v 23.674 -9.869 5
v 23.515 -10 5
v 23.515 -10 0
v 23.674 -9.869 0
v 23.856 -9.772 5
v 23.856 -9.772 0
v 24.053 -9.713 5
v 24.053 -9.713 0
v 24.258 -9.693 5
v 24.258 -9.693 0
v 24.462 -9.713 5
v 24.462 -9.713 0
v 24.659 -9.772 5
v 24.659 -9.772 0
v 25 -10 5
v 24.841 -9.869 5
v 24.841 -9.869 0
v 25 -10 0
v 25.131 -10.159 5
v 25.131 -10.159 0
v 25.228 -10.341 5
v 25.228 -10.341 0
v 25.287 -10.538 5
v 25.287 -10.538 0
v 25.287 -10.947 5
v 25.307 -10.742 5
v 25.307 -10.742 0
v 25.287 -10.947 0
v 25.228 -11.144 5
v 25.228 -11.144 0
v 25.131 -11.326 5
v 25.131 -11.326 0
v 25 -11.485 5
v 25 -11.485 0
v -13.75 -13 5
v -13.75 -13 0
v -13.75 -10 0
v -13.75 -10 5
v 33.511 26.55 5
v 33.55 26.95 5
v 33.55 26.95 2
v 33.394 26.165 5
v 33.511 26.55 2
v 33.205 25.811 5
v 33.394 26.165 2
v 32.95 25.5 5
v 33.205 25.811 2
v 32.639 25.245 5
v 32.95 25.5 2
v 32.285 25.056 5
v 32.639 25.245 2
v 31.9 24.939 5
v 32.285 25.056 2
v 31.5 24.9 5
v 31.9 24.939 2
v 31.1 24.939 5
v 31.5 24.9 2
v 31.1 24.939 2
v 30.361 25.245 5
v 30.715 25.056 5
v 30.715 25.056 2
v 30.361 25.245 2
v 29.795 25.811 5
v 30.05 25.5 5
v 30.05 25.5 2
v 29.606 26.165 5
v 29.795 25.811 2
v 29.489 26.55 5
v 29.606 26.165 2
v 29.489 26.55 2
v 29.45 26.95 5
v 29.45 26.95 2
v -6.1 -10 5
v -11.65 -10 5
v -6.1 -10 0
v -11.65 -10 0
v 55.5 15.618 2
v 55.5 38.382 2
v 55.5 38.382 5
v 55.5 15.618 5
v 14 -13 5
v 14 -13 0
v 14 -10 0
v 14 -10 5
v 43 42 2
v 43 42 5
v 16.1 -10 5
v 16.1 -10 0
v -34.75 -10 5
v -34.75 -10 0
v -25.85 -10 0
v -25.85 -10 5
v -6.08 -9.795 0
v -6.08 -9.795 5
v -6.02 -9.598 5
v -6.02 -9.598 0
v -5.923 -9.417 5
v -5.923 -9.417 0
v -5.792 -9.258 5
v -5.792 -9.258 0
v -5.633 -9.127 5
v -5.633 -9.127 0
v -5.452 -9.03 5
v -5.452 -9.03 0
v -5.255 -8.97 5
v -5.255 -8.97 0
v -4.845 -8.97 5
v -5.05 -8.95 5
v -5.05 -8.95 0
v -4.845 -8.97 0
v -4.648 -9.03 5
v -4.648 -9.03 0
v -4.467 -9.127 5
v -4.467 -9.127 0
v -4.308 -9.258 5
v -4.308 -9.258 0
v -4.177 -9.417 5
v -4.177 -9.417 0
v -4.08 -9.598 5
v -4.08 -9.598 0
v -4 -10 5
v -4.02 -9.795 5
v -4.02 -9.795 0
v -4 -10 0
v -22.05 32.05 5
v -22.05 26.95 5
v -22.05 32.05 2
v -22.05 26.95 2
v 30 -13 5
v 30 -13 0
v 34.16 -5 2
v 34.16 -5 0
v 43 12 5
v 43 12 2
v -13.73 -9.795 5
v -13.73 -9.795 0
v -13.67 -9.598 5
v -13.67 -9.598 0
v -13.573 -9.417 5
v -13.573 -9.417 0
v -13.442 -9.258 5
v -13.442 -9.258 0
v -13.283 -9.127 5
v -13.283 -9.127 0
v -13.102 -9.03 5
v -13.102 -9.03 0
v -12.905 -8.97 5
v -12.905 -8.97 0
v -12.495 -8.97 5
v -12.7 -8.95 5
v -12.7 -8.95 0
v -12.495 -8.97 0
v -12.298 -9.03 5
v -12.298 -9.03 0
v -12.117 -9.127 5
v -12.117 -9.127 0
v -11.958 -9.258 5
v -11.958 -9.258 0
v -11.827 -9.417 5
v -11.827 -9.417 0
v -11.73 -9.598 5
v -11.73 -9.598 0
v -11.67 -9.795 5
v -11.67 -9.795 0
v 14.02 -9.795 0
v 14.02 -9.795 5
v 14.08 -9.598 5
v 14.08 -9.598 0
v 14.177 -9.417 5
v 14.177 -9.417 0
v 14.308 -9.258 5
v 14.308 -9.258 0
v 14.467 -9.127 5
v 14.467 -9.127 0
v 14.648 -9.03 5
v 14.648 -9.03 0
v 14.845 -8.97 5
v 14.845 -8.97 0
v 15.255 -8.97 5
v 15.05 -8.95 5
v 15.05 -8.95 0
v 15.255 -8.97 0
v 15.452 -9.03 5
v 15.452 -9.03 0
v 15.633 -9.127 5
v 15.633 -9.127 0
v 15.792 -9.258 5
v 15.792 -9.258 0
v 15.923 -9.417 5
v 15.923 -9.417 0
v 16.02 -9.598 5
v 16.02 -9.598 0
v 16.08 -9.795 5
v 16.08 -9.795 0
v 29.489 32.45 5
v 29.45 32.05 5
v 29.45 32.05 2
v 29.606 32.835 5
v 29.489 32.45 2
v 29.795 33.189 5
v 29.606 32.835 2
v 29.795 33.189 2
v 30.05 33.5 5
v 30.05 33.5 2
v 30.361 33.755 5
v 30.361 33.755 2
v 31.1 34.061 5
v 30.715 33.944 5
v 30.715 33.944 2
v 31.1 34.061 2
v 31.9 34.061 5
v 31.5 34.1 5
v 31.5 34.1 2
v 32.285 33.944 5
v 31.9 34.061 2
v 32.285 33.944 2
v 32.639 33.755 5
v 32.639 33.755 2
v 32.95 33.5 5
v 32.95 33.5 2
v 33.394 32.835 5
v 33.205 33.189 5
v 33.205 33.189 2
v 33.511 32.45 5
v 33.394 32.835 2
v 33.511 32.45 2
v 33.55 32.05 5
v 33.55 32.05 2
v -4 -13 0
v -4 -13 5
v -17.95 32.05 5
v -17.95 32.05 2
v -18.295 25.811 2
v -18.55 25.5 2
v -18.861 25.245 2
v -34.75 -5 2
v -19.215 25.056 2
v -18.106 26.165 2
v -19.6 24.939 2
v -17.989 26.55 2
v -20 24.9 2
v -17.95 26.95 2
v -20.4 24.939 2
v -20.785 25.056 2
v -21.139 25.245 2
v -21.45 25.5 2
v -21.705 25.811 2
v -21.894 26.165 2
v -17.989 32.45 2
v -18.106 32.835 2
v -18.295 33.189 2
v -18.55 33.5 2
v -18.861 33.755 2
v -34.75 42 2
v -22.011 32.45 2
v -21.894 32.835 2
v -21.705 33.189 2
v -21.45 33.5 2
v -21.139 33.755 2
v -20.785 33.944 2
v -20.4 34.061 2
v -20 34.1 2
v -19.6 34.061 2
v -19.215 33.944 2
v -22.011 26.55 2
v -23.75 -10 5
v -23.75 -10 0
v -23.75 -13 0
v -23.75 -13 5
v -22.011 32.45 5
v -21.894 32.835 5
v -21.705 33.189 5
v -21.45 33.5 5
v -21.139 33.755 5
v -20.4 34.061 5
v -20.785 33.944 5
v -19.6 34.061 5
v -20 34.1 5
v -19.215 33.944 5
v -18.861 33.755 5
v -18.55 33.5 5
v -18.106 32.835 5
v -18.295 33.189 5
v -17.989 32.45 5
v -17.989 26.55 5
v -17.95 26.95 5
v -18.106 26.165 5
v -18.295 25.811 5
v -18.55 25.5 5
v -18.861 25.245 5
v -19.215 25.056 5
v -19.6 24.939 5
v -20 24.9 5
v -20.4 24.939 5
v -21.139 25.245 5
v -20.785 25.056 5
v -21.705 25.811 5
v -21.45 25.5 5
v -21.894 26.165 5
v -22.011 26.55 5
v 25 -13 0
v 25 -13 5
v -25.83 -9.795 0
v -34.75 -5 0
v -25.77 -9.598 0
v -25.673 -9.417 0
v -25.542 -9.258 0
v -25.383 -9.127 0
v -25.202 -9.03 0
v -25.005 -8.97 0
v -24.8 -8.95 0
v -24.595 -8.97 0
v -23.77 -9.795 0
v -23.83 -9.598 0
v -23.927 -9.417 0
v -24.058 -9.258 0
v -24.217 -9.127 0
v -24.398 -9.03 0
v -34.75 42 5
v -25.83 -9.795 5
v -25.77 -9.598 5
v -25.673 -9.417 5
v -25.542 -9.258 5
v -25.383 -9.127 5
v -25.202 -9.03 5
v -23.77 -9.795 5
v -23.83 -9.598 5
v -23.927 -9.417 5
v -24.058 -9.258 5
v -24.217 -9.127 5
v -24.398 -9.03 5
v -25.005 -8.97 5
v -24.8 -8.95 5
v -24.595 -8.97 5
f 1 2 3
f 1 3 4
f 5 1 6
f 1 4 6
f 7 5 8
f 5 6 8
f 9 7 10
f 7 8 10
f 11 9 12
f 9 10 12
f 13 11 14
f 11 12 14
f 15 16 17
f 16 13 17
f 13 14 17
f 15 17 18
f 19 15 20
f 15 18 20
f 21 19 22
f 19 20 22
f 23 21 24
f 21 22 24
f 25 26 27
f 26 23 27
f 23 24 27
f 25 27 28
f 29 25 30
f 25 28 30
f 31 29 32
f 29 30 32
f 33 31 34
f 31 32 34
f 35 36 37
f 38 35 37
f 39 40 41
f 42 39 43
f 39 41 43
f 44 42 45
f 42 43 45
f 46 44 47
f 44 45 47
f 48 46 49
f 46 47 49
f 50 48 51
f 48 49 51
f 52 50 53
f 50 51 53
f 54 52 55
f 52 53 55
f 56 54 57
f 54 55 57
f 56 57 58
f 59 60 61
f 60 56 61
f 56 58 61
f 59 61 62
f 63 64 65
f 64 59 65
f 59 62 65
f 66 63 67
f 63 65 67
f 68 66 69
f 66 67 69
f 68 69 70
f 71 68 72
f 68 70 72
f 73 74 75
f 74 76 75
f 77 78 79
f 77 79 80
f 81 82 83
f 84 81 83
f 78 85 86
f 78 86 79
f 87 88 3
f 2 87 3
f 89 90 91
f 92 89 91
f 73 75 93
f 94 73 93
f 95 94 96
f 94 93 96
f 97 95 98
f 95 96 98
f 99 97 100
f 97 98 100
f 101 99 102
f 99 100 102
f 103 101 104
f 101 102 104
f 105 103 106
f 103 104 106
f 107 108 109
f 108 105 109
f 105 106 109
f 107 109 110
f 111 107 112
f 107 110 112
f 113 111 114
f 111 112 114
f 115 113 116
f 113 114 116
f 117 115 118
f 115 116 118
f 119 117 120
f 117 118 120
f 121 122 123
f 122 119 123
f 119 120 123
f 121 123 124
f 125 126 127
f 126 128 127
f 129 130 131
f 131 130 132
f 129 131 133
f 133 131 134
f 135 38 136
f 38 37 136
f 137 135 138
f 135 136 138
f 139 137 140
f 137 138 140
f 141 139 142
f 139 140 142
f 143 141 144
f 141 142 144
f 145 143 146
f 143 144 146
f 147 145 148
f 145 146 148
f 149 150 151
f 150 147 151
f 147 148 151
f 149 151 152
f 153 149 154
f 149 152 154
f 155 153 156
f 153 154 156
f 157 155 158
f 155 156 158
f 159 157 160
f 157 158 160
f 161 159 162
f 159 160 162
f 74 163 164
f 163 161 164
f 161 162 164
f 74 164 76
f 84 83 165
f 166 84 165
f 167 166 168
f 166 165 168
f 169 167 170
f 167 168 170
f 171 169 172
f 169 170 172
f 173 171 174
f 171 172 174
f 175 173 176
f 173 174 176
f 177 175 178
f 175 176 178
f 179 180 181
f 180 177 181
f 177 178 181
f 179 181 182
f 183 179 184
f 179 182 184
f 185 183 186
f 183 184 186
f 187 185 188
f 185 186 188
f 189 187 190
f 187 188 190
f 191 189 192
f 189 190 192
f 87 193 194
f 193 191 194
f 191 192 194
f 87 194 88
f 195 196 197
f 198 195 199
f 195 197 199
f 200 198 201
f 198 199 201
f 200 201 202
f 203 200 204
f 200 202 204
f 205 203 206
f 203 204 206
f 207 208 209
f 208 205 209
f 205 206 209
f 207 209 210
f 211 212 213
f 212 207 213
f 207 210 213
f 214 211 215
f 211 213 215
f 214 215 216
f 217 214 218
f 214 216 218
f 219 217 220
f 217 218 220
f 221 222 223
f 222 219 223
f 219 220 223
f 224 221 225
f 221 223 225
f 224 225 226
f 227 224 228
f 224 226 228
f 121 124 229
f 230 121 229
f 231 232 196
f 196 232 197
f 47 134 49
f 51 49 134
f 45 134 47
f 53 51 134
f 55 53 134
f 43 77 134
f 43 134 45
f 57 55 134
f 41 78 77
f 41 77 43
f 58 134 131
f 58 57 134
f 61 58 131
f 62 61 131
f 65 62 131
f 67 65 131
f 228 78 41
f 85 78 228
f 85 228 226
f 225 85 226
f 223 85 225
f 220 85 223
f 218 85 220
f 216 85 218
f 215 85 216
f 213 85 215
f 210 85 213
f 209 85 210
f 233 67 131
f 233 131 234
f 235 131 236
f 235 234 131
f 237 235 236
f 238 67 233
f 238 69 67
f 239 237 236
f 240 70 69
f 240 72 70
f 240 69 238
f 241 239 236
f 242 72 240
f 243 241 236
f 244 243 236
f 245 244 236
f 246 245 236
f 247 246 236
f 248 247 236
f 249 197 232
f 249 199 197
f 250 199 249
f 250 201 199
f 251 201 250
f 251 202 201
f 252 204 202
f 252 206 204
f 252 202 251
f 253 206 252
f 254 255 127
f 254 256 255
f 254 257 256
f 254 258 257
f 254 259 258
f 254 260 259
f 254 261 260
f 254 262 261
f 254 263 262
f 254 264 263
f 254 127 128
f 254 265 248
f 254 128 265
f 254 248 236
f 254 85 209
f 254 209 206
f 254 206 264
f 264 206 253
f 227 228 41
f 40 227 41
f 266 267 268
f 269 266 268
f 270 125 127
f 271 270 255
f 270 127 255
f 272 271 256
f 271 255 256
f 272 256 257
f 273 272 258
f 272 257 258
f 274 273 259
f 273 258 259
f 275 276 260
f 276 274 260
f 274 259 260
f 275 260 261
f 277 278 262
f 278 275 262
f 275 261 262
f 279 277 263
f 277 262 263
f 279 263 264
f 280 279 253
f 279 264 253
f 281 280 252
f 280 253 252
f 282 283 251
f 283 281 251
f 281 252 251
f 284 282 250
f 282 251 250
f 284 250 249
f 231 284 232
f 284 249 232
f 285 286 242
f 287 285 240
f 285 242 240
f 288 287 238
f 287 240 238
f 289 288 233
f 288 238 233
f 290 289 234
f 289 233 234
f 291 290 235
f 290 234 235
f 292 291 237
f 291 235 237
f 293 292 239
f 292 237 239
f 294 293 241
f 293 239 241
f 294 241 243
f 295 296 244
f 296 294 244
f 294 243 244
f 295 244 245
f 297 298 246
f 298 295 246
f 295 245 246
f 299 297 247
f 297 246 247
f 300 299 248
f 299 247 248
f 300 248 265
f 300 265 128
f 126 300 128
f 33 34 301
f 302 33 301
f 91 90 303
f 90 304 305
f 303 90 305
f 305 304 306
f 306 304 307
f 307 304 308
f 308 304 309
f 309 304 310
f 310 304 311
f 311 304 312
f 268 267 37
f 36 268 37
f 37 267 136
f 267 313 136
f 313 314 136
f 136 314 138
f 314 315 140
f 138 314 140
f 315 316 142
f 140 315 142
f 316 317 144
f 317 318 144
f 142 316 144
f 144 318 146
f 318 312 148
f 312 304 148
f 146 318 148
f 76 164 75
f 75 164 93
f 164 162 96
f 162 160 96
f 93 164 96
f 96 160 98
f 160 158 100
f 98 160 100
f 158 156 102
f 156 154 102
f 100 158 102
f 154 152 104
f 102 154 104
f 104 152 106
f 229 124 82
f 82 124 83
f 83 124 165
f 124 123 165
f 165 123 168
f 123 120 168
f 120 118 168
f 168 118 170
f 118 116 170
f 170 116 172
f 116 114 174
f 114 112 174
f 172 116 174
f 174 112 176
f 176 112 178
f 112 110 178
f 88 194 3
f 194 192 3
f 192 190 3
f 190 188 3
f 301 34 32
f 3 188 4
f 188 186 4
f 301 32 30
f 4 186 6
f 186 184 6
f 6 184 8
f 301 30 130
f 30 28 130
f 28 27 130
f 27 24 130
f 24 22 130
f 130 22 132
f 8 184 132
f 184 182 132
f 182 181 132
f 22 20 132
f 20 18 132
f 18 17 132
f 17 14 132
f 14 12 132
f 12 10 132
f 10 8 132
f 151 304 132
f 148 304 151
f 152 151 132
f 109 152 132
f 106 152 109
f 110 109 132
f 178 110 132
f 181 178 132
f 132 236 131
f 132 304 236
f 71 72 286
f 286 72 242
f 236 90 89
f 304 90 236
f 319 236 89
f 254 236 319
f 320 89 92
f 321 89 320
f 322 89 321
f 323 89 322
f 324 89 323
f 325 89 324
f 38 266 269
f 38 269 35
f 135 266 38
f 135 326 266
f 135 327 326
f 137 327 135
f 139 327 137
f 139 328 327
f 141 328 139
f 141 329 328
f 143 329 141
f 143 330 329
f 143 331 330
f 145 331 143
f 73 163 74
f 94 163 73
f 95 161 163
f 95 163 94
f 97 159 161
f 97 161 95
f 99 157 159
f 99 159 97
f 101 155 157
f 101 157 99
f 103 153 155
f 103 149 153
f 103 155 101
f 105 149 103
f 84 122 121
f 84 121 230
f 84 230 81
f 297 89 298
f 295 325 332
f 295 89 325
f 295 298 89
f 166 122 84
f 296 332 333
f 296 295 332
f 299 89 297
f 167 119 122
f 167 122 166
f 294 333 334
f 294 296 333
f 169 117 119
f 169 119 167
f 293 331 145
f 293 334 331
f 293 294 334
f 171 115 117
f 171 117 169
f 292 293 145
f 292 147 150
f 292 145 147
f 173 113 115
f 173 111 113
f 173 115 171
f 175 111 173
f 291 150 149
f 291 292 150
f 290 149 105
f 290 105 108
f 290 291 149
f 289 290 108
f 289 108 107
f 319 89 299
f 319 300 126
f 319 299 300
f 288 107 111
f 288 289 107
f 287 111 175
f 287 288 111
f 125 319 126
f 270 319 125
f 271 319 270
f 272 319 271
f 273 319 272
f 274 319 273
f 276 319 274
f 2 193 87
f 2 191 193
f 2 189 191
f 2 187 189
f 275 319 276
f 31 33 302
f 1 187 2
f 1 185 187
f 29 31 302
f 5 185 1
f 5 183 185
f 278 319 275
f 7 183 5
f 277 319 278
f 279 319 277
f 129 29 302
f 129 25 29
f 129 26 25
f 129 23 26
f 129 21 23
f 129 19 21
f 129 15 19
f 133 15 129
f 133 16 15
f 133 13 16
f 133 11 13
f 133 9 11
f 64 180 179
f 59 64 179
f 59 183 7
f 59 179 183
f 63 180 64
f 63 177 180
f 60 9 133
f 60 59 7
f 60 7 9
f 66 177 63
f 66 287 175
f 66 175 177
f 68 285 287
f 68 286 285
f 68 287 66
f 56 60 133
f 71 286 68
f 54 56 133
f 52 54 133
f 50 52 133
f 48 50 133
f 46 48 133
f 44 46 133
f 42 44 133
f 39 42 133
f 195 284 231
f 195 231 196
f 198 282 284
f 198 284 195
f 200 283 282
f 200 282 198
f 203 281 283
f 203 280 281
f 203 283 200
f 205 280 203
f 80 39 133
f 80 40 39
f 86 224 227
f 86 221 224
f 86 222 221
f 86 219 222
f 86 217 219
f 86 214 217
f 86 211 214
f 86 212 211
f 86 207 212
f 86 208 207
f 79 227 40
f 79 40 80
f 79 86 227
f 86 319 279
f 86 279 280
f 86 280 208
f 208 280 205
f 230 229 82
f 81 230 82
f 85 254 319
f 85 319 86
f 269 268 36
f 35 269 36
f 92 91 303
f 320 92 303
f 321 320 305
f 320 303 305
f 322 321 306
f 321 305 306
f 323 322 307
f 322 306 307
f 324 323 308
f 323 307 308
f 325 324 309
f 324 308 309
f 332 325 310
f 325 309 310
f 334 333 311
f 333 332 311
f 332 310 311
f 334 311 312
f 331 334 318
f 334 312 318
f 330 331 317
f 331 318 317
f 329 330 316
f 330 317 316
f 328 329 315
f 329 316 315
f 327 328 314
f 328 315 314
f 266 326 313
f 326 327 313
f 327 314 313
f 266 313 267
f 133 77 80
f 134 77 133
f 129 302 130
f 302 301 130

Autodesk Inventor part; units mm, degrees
ref_plane "YZ Plane" through (0, 0, 0) normal (1, 0, 0) x (0, 1, 0)
ref_plane "XZ Plane" through (0, 0, 0) normal (0, 1, 0) x (-1, 0, 0)
ref_plane "XY Plane" through (0, 0, 0) normal (0, 0, 1) x (1, 0, 0)
sketch "スケッチ1" plane through (0, 0, 0) normal (0, 0, 1) x (1, 0, 0)
  line L0 (-34.75, -10) -> (23.5151, -10) construction
  arc A0 (25, -11.4849) -> (23.5151, -10) centre (24.2575, -10.7425) ccw
  line L1 (25, -11.4849) -> (25, -13)
  line L2 (25, -13) -> (30, -13)
  line L3 (23.5151, -10) -> (25, -10) construction
  line L4 (25, -10) -> (25, -11.4849) construction
  line L5 (-34.75, -10) -> (-34.75, 42)
  line L6 (-34.75, 42) -> (43, 42)
  circle A1 centre (-13, 37) radius 1.2
  circle A2 centre (13, 37) radius 1.2
  line L7 (0, 30.2) -> (0, 0) construction
  line L8 (30, -13) -> (43, 12)
  line L9 (43, 12) -> (43, 42)
  line L10 (-22.05, 32.05) -> (33.55, 32.05)
  line L11 (33.55, 32.05) -> (33.55, 26.95)
  line L12 (33.55, 26.95) -> (-22.05, 26.95)
  line L13 (-22.05, 26.95) -> (-22.05, 32.05)
  line L14 (33.5, 32) -> (-22, 32) construction
  line L15 (-22, 32) -> (-22, 27) construction
  line L16 (-22, 27) -> (33.5, 27) construction
  line L17 (33.5, 27) -> (33.5, 32) construction
  circle A3 centre (-20, 32.05) radius 2.05
  circle A4 centre (-20, 26.95) radius 2.05
  circle A5 centre (31.5, 32.05) radius 2.05
  circle A6 centre (31.5, 26.95) radius 2.05
  line L18 (-34.75, -10) -> (-25.85, -10)
  arc A7 (-23.75, -10) -> (-25.85, -10) centre (-24.8, -10) ccw
  line L19 (-23.75, -10) -> (-23.75, -13)
  line L20 (-23.75, -13) -> (-13.75, -13)
  line L21 (-13.75, -13) -> (-13.75, -10)
  arc A8 (-11.65, -10) -> (-13.75, -10) centre (-12.7, -10) ccw
  line L22 (-11.65, -10) -> (-6.1, -10)
  arc A9 (-4, -10) -> (-6.1, -10) centre (-5.05, -10) ccw
  line L23 (-4, -10) -> (-4, -13)
  line L24 (-4, -13) -> (14, -13)
  line L25 (14, -13) -> (14, -10)
  arc A10 (16.1, -10) -> (14, -10) centre (15.05, -10) ccw
  line L26 (16.1, -10) -> (23.5151, -10)
  line L27 (18.45, -6.1712) -> (21.55, -6.1712) construction
  line L28 (21.55, -6.1712) -> (21.55, -12.9737) construction
  line L29 (21.55, -12.9737) -> (18.45, -12.9737) construction
  line L30 (18.45, -12.9737) -> (18.45, -6.1712) construction
  line L31 (-31.3, -5.7897) -> (-28.2, -5.7897) construction
  line L32 (-28.2, -5.7897) -> (-28.2, -15) construction
  line L33 (-28.2, -15) -> (-31.3, -15) construction
  line L34 (-31.3, -15) -> (-31.3, -5.7897) construction
  line L35 (-29.75, -5.7897) -> (-29.75, -15) construction
  line L36 (20, -6.1712) -> (20, -12.9737) construction
  line L37 (43, 42) -> (55.5, 38.3823)
  line L38 (55.5, 38.3823) -> (55.5, 15.6177)
  line L39 (55.5, 15.6177) -> (43, 12)
  circle A11 centre (51, 35) radius 1.55
  circle A12 centre (51, 19) radius 1.55
  circle A13 centre (51, 35) radius 4.5 construction
  circle A14 centre (51, 19) radius 4.5 construction
  line L40 (51, 35) -> (51, 19) construction
  line L41 (-11.2651, 33.995) -> (-14.7349, 33.995)
  line L42 (-14.7349, 33.995) -> (-16.4699, 37)
  line L43 (-16.4699, 37) -> (-14.7349, 40.005)
  line L44 (-14.7349, 40.005) -> (-11.2651, 40.005)
  line L45 (-11.2651, 40.005) -> (-9.5301, 37)
  line L46 (-9.5301, 37) -> (-11.2651, 33.995)
  circle A15 centre (-15.4199, 37) radius 1.05
  circle A16 centre (-14.2099, 34.9043) radius 1.05
  circle A17 centre (-11.7901, 34.9043) radius 1.05
  circle A18 centre (-10.5801, 37) radius 1.05
  circle A19 centre (-11.7901, 39.0957) radius 1.05
  circle A20 centre (-14.2099, 39.0957) radius 1.05
  line L47 (16.4699, 37) -> (14.7349, 33.995)
  line L48 (14.7349, 33.995) -> (11.2651, 33.995)
  line L49 (11.2651, 33.995) -> (9.5301, 37)
  line L50 (9.5301, 37) -> (11.2651, 40.005)
  line L51 (11.2651, 40.005) -> (14.7349, 40.005)
  line L52 (14.7349, 40.005) -> (16.4699, 37)
  circle A21 centre (10.5801, 37) radius 1.05
  circle A22 centre (11.7901, 34.9043) radius 1.05
  circle A23 centre (14.2099, 34.9043) radius 1.05
  circle A24 centre (15.4199, 37) radius 1.05
  circle A25 centre (14.2099, 39.0957) radius 1.05
  circle A26 centre (11.7901, 39.0957) radius 1.05
  line L53 (1.7349, 33.995) -> (-1.7349, 33.995)
  line L54 (-1.7349, 33.995) -> (-3.4699, 37)
  line L55 (-3.4699, 37) -> (-1.7349, 40.005)
  line L56 (-1.7349, 40.005) -> (1.7349, 40.005)
  line L57 (1.7349, 40.005) -> (3.4699, 37)
  line L58 (3.4699, 37) -> (1.7349, 33.995)
  circle A27 centre (-2.4199, 37) radius 1.05
  circle A28 centre (-1.2099, 34.9043) radius 1.05
  circle A29 centre (1.2099, 34.9043) radius 1.05
  circle A30 centre (2.4199, 37) radius 1.05
  circle A31 centre (1.2099, 39.0957) radius 1.05
  circle A32 centre (-1.2099, 39.0957) radius 1.05
  line L59 (51, 38.1754) -> (53.75, 36.5877)
  line L60 (53.75, 36.5877) -> (53.75, 33.4123)
  line L61 (53.75, 33.4123) -> (51, 31.8246)
  line L62 (51, 31.8246) -> (48.25, 33.4123)
  line L63 (48.25, 33.4123) -> (48.25, 36.5877)
  line L64 (48.25, 36.5877) -> (51, 38.1754)
  point P0 (43, 27)
  point P1 (55.5, 27)
  point P2 (-14.7349, 33.995)
  point P3 (-11.2651, 33.995)
  point P4 (-9.5301, 37)
  point P5 (-11.2651, 40.005)
  point P6 (-14.7349, 40.005)
  point P7 (14.7349, 40.005)
  point P8 (11.2651, 40.005)
  point P9 (0, 37)
  point P10 (3.4699, 37)
  point P11 (1.7349, 40.005)
  point P12 (-1.7349, 40.005)
  dimension "d110" = 4.1
  dimension "d201" = 2.1
  dimension "d42" = 2.4
  dimension "d44" = 13
  dimension "d90" = 5
  dimension "d91" = 59.75
  dimension "d92" = 1.05
  dimension "d93" = 25
  dimension "d95" = 3
  dimension "d96" = 10
  dimension "d97" = 43
  dimension "d98" = 30
  dimension "d99" = 52
  dimension "d100" = 37
  dimension "d104" = 55.5
  dimension "d105" = 0.05
  dimension "d106" = 22
  dimension "d107" = 42
  dimension "d109" = 5
  dimension "d111" = 1.05
  dimension "d113" = 49.75
  dimension "d114" = 5
  dimension "d115" = 3.1
  dimension "d116" = 6
  dimension "d117" = 6
  dimension "d118" = 10
  dimension "d119" = 18
  dimension "d120" = 3
  dimension "d184" = 3.1
  dimension "d186" = 16
  dimension "d200" = 6.01
  dimension "d204" = 360
  dimension "d208" = 360
  dimension "d212" = 360
  dimension "d214" = 13
  dimension "d216" = 5.5
  dimension "d217" = 9
  dimension "d218" = 8
extrude "押し出し1" add sketch "スケッチ1" along normal blind 5 contours A0 L26 A10 L25 L24 L23 A9 L22 A8 L21 L20 L19 A7 L18 L5 L6 L9 L8 L2 L1 | L9 L37 L38 L39 | A1 | A2 | A17 L41 | L41 A17 L46 | L46 A17 | L41 A16 L42 A15 L43 A20 L44 A19 L45 A18 L46 A17 | A16 L41 | L41 L42 A16 | A18 L45 L46 | L46 A18 | A16 L42 | L45 A18 | A19 L44 L45 | L45 A19 | A15 L42 | L42 L43 A15 | L44 A19 | A15 L43 | A20 L43 L44 | L44 A20 | L43 A20 | A23 L47 | A23 L48 A22 L49 A21 L50 A26 L51 A25 L52 A24 L47 | L47 L48 A23 | A23 L48 | A24 L52 L47 | L47 A24 | L52 A24 | A22 L48 | L48 L49 A22 | A25 L51 L52 | L52 A25 | A22 L49 | L51 A25 | A26 L50 L51 | L51 A26 | A21 L49 | L49 L50 A21 | L50 A26 | A21 L50 | A29 L53 | L53 A29 L58 | L58 A29 | L53 A28 L54 A27 L55 A32 L56 A31 L57 A30 L58 A29 | A28 L53 | L53 L54 A28 | A30 L57 L58 | L58 A30 | A28 L54 | L57 A30 | A31 L56 L57 | L57 A31 | A27 L54 | L54 L55 A27 | L56 A31 | A27 L55 | A32 L55 L56 | L56 A32 | L55 A32 | L59 L60 L61 L62 L63 L64
sketch "スケッチ9" plane through (0, 0, 0) normal (0, 0, -1) x (-1, 0, 0)
  line L0 (-16.1, -10) -> (-23.5151, -10) projected
  line L1 (17.95, 26.95) -> (-29.45, 26.95) projected
  arc A0 (-33.55, 26.95) -> (-29.45, 26.95) centre (-31.5, 26.95) ccw projected
  line L2 (-33.55, 26.95) -> (-33.55, 32.05) projected
  arc A1 (-29.45, 32.05) -> (-33.55, 32.05) centre (-31.5, 32.05) ccw projected
  line L3 (-29.45, 32.05) -> (17.95, 32.05) projected
  arc A2 (22.05, 32.05) -> (17.95, 32.05) centre (20, 32.05) ccw projected
  line L4 (22.05, 32.05) -> (22.05, 26.95) projected
  arc A3 (17.95, 26.95) -> (22.05, 26.95) centre (20, 26.95) ccw projected
  circle A4 centre (-10, 36) radius 1.2 projected
  circle A5 centre (10, 36) radius 1.2 projected
  circle A6 centre (-51, 19) radius 1.55 projected
  circle A7 centre (-51, 35) radius 1.55 projected
  line L5 (-67.988, 57.9937) -> (81.7485, 57.9937)
  line L6 (81.7485, 57.9937) -> (81.7485, -5)
  line L7 (81.7485, -5) -> (-67.988, -5)
  line L8 (-67.988, -5) -> (-67.988, 57.9937)
  point P0 (0, 0)
  dimension "d197" = 5
extrude "押し出し5" cut sketch "スケッチ9" against normal blind 2 contours A4 | A5 | L5 L6 L7 L8
sketch "スケッチ12" plane through (0, 0, 5) normal (0, 0, 1) x (1, 0, 0)
  circle A0 centre (51, 35) radius 1.55 projected
  circle A1 centre (51, 35) radius 1.55
  circle A2 centre (51, 27) radius 3 projected
  circle A3 centre (51, 27) radius 3
  circle A4 centre (51, 19) radius 1.55 projected
  circle A5 centre (51, 19) radius 1.55
  point P0 (0, 0)
extrude "押し出し8" add sketch "スケッチ12" against normal up to surface (3 mm away)
equation "\"d91\" = d54"
equation "\"d54\" = 59.75"
properties part number "胴体_サブフレーム_1_1" material "アルミニウム 2014-T4"
